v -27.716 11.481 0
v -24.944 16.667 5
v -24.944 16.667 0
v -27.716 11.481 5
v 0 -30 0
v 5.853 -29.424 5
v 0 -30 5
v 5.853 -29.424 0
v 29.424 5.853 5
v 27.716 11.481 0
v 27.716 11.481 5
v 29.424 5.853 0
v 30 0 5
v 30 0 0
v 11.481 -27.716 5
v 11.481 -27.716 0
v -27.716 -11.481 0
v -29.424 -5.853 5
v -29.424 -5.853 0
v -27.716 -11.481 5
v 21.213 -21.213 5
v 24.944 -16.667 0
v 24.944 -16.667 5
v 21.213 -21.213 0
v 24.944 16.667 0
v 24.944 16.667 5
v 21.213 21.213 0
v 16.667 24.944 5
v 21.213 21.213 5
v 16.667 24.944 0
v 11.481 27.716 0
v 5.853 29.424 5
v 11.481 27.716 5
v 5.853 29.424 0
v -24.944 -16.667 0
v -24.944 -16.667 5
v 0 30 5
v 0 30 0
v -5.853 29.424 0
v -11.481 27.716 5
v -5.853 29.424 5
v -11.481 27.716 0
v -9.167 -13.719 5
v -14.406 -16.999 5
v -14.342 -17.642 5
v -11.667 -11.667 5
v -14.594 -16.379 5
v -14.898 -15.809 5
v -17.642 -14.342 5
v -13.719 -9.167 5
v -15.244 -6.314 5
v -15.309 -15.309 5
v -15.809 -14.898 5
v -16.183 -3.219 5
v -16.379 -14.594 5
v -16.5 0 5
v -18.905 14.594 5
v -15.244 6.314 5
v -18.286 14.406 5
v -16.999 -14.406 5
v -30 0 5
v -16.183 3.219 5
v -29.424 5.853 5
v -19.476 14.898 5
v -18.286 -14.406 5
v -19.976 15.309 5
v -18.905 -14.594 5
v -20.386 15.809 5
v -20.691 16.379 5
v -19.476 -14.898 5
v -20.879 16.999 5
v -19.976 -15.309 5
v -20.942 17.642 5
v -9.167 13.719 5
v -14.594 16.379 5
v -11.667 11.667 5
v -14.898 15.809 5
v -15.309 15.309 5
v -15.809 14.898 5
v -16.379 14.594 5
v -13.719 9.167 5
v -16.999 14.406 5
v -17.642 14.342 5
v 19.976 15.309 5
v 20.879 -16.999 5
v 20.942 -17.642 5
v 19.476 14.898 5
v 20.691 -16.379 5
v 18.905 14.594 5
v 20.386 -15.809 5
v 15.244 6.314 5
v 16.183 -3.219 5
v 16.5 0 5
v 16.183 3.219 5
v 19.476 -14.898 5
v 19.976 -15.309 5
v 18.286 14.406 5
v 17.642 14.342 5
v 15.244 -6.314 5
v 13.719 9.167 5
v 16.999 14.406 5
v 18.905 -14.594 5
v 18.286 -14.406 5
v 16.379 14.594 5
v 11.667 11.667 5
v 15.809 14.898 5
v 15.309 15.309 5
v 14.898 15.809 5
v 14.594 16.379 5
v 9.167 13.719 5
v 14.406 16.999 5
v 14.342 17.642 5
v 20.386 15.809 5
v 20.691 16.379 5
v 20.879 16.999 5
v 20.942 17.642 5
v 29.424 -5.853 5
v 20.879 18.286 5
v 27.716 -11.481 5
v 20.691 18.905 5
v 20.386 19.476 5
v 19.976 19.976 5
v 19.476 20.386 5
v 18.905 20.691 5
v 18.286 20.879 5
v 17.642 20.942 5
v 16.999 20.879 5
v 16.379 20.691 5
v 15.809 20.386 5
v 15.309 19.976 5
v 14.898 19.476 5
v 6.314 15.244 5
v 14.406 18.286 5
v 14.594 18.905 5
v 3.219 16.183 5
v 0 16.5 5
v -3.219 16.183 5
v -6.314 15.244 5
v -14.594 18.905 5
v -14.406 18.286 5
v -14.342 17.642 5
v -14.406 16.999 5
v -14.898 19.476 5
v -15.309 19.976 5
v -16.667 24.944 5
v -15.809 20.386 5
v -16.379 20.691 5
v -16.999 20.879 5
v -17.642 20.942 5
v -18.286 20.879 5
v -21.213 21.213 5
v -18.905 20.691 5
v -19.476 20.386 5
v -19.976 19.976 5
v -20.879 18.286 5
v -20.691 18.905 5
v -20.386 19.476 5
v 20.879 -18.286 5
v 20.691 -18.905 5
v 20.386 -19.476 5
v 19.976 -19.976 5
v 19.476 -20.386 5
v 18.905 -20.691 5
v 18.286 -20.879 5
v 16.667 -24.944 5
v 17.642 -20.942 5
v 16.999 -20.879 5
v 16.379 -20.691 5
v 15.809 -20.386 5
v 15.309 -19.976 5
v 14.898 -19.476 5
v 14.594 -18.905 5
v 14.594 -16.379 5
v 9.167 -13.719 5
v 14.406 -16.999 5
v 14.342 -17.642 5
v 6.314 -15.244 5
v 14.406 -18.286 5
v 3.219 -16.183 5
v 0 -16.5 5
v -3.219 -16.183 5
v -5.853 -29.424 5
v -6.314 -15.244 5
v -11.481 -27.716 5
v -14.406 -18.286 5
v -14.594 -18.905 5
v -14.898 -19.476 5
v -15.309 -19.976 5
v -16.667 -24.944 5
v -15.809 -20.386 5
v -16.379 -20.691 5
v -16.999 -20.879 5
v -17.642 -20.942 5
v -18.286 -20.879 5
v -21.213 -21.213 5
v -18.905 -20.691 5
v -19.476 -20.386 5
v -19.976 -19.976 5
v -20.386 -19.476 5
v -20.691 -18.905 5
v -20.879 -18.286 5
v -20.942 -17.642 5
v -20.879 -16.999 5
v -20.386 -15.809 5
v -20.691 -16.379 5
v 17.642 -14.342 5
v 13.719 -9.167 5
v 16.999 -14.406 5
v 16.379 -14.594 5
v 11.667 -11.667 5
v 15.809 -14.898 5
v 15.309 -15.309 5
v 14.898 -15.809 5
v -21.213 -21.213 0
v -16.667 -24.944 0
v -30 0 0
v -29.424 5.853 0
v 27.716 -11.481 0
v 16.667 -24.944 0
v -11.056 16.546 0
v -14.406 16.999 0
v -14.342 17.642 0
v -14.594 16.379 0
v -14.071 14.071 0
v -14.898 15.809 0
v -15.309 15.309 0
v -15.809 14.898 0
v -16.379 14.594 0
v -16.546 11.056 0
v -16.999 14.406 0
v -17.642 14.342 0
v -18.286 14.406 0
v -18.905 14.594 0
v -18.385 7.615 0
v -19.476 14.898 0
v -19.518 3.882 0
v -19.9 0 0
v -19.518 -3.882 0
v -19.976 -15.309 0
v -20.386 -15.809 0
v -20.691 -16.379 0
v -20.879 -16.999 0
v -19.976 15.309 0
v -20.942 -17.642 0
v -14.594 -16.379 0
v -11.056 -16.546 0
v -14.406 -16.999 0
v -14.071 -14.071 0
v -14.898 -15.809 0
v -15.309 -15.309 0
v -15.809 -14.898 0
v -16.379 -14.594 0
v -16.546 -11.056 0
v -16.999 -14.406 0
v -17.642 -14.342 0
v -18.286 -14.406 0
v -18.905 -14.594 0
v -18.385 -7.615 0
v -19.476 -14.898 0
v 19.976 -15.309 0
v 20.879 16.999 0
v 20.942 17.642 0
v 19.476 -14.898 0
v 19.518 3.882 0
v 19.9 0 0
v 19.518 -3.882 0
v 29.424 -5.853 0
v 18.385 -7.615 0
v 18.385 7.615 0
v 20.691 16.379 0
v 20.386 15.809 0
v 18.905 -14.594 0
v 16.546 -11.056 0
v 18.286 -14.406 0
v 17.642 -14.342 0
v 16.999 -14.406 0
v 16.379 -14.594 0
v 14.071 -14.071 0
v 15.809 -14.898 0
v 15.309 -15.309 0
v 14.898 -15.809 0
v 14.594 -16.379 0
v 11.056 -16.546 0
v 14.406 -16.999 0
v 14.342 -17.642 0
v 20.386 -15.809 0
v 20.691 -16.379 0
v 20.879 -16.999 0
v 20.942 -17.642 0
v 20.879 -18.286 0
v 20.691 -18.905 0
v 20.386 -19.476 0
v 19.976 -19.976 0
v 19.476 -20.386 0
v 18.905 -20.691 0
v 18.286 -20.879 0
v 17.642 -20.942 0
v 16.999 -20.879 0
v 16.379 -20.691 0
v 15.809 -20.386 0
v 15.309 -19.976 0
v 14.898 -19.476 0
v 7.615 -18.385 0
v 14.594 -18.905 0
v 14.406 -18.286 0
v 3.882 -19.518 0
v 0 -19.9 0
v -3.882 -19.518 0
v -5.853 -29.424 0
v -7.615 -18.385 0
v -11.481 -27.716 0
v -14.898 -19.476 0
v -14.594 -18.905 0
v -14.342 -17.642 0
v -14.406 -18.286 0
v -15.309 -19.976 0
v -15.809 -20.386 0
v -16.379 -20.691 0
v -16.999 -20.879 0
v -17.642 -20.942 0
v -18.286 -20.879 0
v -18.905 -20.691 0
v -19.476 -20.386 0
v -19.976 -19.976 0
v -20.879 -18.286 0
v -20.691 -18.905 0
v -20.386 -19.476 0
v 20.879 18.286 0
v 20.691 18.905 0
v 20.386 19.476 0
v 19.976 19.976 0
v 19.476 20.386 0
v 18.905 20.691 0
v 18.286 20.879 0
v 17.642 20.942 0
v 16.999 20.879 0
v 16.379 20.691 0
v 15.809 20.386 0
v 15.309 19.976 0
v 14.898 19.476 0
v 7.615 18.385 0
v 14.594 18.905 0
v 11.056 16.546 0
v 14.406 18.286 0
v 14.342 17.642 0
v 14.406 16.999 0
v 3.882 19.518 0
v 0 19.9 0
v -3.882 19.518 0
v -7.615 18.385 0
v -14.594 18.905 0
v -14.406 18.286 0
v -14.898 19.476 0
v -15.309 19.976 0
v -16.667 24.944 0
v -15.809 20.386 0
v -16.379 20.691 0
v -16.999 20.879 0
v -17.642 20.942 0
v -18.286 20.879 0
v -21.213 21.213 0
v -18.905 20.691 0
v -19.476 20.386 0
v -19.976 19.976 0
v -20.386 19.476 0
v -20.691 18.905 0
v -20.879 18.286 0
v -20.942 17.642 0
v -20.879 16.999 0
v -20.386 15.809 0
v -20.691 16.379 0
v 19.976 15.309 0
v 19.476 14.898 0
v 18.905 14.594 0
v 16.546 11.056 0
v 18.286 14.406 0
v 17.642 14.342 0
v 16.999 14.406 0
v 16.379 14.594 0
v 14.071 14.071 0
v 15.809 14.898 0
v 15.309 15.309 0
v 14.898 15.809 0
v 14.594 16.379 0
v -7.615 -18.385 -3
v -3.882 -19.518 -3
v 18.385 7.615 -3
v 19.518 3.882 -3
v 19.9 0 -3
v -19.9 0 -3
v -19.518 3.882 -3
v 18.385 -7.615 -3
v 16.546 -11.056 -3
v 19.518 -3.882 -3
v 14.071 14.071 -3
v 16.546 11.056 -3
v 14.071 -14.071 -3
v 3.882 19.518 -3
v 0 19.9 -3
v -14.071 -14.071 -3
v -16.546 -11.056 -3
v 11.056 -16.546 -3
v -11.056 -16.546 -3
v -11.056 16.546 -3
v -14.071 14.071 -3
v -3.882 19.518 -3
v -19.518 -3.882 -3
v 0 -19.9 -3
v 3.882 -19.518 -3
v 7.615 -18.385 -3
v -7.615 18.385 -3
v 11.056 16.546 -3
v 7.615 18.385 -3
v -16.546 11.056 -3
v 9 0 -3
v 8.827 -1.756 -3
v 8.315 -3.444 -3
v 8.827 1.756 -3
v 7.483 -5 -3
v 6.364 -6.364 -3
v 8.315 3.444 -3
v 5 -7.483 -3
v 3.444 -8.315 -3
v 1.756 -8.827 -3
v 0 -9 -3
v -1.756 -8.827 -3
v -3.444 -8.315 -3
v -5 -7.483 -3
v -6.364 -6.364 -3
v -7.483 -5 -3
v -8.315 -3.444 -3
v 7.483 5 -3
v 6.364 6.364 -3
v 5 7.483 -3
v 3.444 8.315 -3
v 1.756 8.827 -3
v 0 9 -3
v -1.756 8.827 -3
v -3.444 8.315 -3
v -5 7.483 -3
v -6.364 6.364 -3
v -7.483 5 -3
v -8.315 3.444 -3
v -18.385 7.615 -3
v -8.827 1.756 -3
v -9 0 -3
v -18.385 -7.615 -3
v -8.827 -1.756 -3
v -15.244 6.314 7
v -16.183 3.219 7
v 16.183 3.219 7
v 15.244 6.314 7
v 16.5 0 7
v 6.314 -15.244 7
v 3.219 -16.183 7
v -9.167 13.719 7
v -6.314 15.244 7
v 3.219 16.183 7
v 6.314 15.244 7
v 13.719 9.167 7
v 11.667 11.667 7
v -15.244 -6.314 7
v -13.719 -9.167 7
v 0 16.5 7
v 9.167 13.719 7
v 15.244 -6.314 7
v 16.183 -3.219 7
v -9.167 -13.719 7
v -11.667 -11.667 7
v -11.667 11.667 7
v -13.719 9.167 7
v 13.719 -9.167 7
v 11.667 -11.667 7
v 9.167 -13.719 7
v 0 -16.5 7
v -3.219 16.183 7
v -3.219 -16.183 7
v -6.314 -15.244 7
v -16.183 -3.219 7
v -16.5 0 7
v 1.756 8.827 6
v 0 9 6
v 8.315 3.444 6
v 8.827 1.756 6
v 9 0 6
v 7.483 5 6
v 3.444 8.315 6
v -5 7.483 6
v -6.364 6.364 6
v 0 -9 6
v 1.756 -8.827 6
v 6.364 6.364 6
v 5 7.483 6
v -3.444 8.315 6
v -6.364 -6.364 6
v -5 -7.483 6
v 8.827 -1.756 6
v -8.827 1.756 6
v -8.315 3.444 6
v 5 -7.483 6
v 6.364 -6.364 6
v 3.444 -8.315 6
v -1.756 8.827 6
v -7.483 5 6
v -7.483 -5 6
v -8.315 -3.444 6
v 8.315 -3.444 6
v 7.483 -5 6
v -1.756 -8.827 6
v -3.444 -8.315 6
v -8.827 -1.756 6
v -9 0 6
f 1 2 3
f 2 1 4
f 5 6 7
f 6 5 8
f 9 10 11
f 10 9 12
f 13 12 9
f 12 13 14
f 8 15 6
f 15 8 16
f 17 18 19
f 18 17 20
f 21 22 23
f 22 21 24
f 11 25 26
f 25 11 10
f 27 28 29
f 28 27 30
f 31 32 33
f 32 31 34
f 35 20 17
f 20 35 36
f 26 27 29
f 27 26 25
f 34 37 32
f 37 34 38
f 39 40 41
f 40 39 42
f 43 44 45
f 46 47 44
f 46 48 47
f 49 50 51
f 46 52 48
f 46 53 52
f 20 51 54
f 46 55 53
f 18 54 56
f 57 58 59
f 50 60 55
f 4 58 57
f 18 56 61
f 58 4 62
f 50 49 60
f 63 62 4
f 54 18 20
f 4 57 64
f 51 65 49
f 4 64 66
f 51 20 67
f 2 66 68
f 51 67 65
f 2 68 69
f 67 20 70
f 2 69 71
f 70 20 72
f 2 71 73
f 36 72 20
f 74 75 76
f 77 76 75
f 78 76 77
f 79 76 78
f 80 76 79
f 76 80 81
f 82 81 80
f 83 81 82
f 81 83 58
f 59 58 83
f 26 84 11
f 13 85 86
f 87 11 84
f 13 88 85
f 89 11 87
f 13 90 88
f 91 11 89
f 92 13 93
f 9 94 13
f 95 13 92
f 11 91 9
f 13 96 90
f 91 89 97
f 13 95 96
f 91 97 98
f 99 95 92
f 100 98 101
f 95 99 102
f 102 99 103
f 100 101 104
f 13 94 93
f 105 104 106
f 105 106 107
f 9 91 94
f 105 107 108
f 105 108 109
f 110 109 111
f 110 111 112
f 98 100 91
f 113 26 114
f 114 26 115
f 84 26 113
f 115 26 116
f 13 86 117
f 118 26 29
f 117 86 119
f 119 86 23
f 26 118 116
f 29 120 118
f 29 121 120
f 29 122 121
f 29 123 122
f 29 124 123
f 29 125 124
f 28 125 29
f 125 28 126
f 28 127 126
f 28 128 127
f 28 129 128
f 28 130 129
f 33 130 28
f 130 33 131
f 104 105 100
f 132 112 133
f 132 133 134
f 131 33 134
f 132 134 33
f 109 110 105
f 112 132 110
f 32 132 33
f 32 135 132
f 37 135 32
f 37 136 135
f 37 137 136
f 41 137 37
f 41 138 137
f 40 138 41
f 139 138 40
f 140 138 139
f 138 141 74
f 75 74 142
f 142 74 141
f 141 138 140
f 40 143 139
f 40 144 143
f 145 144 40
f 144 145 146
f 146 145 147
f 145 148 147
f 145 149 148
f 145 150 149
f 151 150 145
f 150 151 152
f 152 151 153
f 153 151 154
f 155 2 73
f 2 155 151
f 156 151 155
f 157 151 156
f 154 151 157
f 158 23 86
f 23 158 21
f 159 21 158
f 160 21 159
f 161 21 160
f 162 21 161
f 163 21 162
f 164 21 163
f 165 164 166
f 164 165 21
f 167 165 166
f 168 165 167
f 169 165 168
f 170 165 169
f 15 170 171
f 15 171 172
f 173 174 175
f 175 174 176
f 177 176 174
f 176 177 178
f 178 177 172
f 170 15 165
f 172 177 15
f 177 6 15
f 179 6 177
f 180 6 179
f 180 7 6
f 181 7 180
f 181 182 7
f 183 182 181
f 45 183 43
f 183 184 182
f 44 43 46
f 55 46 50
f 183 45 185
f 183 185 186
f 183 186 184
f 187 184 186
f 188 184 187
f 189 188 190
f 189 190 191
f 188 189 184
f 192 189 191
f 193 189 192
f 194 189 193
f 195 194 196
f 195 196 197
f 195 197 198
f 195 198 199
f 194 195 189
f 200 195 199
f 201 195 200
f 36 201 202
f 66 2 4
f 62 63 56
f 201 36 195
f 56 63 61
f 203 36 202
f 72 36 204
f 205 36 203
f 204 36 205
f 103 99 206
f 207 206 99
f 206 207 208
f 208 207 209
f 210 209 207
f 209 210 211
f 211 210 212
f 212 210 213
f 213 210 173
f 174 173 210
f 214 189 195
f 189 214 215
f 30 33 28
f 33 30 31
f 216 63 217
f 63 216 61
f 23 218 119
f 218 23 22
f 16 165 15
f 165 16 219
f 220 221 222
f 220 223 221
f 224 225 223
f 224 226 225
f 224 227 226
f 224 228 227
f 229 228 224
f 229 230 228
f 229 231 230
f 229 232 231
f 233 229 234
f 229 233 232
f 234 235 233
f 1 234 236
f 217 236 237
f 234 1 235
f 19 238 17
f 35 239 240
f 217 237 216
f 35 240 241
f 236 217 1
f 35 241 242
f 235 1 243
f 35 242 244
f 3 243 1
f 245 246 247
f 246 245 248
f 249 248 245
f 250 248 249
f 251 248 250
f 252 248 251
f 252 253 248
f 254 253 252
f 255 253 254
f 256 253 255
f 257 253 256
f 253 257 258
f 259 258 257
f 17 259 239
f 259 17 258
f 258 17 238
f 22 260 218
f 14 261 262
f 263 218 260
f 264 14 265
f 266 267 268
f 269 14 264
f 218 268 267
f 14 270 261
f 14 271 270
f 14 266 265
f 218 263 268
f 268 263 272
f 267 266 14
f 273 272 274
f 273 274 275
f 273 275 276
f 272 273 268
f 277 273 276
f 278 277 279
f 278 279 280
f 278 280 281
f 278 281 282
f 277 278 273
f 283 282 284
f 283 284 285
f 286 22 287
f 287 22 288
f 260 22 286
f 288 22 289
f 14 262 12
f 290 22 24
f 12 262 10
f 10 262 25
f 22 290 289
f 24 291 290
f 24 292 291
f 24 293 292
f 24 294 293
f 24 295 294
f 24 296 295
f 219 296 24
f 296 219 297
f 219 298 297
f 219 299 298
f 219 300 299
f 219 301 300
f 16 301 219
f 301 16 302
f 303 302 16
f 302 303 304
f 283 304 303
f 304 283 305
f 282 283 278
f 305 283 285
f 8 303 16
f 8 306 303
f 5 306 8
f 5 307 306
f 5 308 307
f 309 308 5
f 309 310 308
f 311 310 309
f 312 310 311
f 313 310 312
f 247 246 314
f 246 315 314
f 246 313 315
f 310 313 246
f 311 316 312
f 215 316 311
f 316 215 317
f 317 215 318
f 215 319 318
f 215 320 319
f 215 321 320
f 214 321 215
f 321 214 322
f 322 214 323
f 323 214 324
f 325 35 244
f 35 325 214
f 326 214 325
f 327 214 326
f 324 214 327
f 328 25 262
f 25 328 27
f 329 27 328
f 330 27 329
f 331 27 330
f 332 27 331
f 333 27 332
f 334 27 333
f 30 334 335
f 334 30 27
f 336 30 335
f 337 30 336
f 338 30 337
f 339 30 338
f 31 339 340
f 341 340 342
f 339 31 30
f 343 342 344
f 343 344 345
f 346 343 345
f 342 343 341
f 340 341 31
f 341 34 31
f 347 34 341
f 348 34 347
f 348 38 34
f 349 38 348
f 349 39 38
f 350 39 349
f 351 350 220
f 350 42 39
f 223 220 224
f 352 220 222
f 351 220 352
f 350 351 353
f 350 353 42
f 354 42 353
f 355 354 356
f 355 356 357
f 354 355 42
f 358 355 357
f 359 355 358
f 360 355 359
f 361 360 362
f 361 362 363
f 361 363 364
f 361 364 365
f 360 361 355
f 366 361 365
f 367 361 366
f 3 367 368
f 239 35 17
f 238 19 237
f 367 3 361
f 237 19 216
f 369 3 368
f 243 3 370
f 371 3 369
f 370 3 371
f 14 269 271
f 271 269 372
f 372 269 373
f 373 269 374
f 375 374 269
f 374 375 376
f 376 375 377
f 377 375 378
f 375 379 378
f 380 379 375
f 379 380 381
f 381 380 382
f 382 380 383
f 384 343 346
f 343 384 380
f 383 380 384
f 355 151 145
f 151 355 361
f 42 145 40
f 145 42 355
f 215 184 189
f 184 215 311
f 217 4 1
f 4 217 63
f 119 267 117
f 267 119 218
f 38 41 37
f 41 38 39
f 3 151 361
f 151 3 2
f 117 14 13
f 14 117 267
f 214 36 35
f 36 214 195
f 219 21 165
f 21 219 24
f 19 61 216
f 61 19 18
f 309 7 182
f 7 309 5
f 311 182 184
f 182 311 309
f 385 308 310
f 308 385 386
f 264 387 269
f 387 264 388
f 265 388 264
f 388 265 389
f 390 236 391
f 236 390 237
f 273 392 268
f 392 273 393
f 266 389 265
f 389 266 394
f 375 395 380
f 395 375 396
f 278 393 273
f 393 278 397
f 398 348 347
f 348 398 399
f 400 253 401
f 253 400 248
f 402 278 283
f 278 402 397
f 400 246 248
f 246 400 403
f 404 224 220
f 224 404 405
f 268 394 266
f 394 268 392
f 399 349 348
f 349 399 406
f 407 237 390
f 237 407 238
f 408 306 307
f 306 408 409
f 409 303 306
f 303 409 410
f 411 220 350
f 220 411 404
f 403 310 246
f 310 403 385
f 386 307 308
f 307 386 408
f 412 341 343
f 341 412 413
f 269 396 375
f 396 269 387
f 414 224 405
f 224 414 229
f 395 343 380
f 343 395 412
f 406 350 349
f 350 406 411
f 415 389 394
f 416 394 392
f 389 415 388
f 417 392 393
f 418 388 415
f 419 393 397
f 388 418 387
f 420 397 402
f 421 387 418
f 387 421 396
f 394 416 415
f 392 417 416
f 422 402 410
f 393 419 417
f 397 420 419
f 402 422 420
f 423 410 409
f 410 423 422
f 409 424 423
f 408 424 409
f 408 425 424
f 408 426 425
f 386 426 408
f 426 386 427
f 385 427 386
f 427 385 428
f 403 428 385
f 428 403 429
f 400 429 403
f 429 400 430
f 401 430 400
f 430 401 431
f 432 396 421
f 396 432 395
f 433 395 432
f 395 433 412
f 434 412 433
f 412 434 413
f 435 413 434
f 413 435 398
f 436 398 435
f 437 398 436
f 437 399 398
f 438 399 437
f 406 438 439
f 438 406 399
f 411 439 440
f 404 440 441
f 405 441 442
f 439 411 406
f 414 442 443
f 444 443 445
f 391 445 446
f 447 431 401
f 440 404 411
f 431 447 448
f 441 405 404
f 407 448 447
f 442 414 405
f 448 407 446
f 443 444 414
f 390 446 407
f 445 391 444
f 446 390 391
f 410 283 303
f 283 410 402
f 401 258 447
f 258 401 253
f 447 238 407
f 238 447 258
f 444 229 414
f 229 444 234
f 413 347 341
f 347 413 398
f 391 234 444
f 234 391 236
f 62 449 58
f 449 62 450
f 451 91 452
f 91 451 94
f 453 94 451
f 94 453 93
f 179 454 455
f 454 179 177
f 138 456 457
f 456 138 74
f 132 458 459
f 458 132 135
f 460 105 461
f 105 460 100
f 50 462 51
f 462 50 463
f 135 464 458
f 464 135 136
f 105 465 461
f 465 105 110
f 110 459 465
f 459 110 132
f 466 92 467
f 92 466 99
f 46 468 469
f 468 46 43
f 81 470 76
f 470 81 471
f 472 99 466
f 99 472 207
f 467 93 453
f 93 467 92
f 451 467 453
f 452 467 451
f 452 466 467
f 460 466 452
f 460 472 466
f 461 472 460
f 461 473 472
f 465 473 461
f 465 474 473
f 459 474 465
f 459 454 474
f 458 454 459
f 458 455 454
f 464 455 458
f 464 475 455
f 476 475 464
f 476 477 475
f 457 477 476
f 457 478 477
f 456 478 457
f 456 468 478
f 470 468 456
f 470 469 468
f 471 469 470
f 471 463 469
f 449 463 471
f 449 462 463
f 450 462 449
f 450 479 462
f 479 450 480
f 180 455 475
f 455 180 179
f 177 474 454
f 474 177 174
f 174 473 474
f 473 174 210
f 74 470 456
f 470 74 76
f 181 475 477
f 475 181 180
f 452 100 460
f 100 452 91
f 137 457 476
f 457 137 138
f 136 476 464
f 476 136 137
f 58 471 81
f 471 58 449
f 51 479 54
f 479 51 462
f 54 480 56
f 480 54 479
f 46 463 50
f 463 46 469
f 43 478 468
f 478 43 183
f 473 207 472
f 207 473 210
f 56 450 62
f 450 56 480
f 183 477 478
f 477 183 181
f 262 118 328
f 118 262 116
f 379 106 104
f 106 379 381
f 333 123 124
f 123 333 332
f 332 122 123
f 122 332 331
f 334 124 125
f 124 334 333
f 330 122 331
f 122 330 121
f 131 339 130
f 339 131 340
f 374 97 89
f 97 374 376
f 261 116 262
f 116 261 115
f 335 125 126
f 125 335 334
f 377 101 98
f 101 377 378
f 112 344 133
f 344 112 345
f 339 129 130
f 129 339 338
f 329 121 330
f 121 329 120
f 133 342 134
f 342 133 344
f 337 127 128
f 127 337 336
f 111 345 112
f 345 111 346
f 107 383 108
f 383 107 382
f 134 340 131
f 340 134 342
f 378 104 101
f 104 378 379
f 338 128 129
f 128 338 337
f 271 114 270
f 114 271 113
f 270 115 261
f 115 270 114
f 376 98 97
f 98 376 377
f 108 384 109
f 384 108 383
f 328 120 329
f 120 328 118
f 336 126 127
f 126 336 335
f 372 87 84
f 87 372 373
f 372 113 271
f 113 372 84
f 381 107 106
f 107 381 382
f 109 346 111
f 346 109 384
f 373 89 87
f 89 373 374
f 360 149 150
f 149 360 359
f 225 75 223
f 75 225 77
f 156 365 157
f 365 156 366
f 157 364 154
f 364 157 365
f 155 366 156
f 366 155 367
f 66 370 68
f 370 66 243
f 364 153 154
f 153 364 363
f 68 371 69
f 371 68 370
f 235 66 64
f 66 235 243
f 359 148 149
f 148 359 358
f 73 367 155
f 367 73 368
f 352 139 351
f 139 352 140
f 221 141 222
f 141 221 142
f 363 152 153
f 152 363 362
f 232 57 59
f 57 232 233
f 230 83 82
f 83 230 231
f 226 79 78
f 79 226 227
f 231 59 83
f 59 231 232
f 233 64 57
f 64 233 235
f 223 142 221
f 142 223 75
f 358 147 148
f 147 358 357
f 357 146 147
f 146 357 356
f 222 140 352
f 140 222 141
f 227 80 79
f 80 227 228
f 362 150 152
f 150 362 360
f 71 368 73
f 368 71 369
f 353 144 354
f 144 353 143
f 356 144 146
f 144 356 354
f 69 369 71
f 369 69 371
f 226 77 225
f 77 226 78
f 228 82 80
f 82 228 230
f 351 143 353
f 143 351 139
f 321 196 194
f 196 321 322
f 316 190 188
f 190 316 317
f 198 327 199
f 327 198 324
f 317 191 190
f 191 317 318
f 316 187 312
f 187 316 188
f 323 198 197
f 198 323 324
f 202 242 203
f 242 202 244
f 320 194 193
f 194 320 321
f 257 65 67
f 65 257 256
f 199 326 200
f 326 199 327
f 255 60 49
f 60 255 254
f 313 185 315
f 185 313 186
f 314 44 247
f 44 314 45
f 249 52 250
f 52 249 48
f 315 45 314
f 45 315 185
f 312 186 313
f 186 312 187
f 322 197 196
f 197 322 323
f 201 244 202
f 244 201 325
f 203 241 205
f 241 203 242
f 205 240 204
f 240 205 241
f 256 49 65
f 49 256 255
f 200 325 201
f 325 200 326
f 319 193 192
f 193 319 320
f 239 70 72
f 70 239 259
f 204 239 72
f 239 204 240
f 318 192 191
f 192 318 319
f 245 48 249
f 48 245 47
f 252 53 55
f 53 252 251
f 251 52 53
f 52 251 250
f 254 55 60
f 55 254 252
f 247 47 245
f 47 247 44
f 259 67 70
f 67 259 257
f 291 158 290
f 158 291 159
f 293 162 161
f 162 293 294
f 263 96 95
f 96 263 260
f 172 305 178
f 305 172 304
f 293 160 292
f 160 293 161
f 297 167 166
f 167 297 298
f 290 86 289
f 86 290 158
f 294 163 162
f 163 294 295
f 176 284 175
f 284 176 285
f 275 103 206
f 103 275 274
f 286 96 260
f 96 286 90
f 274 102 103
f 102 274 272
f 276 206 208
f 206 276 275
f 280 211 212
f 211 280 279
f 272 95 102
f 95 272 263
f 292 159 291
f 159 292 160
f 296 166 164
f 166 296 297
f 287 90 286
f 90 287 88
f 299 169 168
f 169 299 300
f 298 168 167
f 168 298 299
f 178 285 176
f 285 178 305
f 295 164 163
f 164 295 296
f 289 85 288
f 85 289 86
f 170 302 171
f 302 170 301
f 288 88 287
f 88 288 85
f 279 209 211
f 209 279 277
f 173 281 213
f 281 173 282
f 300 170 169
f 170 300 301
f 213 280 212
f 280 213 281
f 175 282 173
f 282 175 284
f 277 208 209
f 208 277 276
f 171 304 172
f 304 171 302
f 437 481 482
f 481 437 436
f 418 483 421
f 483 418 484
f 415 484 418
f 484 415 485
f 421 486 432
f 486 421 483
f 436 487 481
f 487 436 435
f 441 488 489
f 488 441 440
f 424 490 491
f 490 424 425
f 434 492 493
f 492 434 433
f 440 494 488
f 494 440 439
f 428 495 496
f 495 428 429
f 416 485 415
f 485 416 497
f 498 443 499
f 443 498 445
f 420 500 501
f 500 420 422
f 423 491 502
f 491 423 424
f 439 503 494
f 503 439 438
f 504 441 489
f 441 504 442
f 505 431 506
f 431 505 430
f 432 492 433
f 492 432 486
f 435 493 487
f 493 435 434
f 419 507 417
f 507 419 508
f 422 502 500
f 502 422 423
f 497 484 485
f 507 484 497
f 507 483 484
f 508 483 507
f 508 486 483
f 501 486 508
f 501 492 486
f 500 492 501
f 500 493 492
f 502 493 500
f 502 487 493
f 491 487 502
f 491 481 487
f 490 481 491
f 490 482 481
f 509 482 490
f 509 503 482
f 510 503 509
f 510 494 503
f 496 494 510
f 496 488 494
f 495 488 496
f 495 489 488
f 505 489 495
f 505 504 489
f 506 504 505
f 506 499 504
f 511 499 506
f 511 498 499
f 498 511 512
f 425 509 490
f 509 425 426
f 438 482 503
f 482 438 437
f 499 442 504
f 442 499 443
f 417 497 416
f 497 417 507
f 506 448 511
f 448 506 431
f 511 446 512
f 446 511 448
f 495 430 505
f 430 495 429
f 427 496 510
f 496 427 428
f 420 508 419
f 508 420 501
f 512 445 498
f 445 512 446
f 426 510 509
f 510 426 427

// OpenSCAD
$fn = 32;

// ----------------------------------------------------------------------
// Retaining cap: 6203 cover, 60 mm, spigot 39.8 mm
// ----------------------------------------------------------------------

// --- parameters (mm) ---
plate_d = 60;             // cover diameter
plate_t = 5;              // cover thickness
boss_d = 39.8;            // spigot that enters the housing
boss_h = 3;               // spigot height
shaft_d = 18;             // shaft opening
bolt_d = 6.6;             // bolt clearance
bolt_r = 24.95;           // bolt circle radius
dome_h = 2;               // raised centre

module cover() {
  cylinder(h = plate_t, d = plate_d);
}

module spigot() {
  /* sunk 1 mm into the cover; the spigot sets the overall height */
  translate([0, 0, -boss_h]) cylinder(h = boss_h + 1, d = boss_d);
}

module dome() {
  translate([0, 0, plate_t - 1]) cylinder(h = dome_h + 1, d = plate_d * 0.55);
}

difference() {
  union() {
    cover();
    spigot();
    dome();
  }
  for (i = [0 : 3]) rotate([0, 0, 45 + i * 90]) translate([bolt_r, 0, -boss_h - 1])
    cylinder(h = boss_h + plate_t + 2, d = bolt_d);
  translate([0, 0, -boss_h - 1]) cylinder(h = boss_h + plate_t + 2, d = shaft_d);
}
